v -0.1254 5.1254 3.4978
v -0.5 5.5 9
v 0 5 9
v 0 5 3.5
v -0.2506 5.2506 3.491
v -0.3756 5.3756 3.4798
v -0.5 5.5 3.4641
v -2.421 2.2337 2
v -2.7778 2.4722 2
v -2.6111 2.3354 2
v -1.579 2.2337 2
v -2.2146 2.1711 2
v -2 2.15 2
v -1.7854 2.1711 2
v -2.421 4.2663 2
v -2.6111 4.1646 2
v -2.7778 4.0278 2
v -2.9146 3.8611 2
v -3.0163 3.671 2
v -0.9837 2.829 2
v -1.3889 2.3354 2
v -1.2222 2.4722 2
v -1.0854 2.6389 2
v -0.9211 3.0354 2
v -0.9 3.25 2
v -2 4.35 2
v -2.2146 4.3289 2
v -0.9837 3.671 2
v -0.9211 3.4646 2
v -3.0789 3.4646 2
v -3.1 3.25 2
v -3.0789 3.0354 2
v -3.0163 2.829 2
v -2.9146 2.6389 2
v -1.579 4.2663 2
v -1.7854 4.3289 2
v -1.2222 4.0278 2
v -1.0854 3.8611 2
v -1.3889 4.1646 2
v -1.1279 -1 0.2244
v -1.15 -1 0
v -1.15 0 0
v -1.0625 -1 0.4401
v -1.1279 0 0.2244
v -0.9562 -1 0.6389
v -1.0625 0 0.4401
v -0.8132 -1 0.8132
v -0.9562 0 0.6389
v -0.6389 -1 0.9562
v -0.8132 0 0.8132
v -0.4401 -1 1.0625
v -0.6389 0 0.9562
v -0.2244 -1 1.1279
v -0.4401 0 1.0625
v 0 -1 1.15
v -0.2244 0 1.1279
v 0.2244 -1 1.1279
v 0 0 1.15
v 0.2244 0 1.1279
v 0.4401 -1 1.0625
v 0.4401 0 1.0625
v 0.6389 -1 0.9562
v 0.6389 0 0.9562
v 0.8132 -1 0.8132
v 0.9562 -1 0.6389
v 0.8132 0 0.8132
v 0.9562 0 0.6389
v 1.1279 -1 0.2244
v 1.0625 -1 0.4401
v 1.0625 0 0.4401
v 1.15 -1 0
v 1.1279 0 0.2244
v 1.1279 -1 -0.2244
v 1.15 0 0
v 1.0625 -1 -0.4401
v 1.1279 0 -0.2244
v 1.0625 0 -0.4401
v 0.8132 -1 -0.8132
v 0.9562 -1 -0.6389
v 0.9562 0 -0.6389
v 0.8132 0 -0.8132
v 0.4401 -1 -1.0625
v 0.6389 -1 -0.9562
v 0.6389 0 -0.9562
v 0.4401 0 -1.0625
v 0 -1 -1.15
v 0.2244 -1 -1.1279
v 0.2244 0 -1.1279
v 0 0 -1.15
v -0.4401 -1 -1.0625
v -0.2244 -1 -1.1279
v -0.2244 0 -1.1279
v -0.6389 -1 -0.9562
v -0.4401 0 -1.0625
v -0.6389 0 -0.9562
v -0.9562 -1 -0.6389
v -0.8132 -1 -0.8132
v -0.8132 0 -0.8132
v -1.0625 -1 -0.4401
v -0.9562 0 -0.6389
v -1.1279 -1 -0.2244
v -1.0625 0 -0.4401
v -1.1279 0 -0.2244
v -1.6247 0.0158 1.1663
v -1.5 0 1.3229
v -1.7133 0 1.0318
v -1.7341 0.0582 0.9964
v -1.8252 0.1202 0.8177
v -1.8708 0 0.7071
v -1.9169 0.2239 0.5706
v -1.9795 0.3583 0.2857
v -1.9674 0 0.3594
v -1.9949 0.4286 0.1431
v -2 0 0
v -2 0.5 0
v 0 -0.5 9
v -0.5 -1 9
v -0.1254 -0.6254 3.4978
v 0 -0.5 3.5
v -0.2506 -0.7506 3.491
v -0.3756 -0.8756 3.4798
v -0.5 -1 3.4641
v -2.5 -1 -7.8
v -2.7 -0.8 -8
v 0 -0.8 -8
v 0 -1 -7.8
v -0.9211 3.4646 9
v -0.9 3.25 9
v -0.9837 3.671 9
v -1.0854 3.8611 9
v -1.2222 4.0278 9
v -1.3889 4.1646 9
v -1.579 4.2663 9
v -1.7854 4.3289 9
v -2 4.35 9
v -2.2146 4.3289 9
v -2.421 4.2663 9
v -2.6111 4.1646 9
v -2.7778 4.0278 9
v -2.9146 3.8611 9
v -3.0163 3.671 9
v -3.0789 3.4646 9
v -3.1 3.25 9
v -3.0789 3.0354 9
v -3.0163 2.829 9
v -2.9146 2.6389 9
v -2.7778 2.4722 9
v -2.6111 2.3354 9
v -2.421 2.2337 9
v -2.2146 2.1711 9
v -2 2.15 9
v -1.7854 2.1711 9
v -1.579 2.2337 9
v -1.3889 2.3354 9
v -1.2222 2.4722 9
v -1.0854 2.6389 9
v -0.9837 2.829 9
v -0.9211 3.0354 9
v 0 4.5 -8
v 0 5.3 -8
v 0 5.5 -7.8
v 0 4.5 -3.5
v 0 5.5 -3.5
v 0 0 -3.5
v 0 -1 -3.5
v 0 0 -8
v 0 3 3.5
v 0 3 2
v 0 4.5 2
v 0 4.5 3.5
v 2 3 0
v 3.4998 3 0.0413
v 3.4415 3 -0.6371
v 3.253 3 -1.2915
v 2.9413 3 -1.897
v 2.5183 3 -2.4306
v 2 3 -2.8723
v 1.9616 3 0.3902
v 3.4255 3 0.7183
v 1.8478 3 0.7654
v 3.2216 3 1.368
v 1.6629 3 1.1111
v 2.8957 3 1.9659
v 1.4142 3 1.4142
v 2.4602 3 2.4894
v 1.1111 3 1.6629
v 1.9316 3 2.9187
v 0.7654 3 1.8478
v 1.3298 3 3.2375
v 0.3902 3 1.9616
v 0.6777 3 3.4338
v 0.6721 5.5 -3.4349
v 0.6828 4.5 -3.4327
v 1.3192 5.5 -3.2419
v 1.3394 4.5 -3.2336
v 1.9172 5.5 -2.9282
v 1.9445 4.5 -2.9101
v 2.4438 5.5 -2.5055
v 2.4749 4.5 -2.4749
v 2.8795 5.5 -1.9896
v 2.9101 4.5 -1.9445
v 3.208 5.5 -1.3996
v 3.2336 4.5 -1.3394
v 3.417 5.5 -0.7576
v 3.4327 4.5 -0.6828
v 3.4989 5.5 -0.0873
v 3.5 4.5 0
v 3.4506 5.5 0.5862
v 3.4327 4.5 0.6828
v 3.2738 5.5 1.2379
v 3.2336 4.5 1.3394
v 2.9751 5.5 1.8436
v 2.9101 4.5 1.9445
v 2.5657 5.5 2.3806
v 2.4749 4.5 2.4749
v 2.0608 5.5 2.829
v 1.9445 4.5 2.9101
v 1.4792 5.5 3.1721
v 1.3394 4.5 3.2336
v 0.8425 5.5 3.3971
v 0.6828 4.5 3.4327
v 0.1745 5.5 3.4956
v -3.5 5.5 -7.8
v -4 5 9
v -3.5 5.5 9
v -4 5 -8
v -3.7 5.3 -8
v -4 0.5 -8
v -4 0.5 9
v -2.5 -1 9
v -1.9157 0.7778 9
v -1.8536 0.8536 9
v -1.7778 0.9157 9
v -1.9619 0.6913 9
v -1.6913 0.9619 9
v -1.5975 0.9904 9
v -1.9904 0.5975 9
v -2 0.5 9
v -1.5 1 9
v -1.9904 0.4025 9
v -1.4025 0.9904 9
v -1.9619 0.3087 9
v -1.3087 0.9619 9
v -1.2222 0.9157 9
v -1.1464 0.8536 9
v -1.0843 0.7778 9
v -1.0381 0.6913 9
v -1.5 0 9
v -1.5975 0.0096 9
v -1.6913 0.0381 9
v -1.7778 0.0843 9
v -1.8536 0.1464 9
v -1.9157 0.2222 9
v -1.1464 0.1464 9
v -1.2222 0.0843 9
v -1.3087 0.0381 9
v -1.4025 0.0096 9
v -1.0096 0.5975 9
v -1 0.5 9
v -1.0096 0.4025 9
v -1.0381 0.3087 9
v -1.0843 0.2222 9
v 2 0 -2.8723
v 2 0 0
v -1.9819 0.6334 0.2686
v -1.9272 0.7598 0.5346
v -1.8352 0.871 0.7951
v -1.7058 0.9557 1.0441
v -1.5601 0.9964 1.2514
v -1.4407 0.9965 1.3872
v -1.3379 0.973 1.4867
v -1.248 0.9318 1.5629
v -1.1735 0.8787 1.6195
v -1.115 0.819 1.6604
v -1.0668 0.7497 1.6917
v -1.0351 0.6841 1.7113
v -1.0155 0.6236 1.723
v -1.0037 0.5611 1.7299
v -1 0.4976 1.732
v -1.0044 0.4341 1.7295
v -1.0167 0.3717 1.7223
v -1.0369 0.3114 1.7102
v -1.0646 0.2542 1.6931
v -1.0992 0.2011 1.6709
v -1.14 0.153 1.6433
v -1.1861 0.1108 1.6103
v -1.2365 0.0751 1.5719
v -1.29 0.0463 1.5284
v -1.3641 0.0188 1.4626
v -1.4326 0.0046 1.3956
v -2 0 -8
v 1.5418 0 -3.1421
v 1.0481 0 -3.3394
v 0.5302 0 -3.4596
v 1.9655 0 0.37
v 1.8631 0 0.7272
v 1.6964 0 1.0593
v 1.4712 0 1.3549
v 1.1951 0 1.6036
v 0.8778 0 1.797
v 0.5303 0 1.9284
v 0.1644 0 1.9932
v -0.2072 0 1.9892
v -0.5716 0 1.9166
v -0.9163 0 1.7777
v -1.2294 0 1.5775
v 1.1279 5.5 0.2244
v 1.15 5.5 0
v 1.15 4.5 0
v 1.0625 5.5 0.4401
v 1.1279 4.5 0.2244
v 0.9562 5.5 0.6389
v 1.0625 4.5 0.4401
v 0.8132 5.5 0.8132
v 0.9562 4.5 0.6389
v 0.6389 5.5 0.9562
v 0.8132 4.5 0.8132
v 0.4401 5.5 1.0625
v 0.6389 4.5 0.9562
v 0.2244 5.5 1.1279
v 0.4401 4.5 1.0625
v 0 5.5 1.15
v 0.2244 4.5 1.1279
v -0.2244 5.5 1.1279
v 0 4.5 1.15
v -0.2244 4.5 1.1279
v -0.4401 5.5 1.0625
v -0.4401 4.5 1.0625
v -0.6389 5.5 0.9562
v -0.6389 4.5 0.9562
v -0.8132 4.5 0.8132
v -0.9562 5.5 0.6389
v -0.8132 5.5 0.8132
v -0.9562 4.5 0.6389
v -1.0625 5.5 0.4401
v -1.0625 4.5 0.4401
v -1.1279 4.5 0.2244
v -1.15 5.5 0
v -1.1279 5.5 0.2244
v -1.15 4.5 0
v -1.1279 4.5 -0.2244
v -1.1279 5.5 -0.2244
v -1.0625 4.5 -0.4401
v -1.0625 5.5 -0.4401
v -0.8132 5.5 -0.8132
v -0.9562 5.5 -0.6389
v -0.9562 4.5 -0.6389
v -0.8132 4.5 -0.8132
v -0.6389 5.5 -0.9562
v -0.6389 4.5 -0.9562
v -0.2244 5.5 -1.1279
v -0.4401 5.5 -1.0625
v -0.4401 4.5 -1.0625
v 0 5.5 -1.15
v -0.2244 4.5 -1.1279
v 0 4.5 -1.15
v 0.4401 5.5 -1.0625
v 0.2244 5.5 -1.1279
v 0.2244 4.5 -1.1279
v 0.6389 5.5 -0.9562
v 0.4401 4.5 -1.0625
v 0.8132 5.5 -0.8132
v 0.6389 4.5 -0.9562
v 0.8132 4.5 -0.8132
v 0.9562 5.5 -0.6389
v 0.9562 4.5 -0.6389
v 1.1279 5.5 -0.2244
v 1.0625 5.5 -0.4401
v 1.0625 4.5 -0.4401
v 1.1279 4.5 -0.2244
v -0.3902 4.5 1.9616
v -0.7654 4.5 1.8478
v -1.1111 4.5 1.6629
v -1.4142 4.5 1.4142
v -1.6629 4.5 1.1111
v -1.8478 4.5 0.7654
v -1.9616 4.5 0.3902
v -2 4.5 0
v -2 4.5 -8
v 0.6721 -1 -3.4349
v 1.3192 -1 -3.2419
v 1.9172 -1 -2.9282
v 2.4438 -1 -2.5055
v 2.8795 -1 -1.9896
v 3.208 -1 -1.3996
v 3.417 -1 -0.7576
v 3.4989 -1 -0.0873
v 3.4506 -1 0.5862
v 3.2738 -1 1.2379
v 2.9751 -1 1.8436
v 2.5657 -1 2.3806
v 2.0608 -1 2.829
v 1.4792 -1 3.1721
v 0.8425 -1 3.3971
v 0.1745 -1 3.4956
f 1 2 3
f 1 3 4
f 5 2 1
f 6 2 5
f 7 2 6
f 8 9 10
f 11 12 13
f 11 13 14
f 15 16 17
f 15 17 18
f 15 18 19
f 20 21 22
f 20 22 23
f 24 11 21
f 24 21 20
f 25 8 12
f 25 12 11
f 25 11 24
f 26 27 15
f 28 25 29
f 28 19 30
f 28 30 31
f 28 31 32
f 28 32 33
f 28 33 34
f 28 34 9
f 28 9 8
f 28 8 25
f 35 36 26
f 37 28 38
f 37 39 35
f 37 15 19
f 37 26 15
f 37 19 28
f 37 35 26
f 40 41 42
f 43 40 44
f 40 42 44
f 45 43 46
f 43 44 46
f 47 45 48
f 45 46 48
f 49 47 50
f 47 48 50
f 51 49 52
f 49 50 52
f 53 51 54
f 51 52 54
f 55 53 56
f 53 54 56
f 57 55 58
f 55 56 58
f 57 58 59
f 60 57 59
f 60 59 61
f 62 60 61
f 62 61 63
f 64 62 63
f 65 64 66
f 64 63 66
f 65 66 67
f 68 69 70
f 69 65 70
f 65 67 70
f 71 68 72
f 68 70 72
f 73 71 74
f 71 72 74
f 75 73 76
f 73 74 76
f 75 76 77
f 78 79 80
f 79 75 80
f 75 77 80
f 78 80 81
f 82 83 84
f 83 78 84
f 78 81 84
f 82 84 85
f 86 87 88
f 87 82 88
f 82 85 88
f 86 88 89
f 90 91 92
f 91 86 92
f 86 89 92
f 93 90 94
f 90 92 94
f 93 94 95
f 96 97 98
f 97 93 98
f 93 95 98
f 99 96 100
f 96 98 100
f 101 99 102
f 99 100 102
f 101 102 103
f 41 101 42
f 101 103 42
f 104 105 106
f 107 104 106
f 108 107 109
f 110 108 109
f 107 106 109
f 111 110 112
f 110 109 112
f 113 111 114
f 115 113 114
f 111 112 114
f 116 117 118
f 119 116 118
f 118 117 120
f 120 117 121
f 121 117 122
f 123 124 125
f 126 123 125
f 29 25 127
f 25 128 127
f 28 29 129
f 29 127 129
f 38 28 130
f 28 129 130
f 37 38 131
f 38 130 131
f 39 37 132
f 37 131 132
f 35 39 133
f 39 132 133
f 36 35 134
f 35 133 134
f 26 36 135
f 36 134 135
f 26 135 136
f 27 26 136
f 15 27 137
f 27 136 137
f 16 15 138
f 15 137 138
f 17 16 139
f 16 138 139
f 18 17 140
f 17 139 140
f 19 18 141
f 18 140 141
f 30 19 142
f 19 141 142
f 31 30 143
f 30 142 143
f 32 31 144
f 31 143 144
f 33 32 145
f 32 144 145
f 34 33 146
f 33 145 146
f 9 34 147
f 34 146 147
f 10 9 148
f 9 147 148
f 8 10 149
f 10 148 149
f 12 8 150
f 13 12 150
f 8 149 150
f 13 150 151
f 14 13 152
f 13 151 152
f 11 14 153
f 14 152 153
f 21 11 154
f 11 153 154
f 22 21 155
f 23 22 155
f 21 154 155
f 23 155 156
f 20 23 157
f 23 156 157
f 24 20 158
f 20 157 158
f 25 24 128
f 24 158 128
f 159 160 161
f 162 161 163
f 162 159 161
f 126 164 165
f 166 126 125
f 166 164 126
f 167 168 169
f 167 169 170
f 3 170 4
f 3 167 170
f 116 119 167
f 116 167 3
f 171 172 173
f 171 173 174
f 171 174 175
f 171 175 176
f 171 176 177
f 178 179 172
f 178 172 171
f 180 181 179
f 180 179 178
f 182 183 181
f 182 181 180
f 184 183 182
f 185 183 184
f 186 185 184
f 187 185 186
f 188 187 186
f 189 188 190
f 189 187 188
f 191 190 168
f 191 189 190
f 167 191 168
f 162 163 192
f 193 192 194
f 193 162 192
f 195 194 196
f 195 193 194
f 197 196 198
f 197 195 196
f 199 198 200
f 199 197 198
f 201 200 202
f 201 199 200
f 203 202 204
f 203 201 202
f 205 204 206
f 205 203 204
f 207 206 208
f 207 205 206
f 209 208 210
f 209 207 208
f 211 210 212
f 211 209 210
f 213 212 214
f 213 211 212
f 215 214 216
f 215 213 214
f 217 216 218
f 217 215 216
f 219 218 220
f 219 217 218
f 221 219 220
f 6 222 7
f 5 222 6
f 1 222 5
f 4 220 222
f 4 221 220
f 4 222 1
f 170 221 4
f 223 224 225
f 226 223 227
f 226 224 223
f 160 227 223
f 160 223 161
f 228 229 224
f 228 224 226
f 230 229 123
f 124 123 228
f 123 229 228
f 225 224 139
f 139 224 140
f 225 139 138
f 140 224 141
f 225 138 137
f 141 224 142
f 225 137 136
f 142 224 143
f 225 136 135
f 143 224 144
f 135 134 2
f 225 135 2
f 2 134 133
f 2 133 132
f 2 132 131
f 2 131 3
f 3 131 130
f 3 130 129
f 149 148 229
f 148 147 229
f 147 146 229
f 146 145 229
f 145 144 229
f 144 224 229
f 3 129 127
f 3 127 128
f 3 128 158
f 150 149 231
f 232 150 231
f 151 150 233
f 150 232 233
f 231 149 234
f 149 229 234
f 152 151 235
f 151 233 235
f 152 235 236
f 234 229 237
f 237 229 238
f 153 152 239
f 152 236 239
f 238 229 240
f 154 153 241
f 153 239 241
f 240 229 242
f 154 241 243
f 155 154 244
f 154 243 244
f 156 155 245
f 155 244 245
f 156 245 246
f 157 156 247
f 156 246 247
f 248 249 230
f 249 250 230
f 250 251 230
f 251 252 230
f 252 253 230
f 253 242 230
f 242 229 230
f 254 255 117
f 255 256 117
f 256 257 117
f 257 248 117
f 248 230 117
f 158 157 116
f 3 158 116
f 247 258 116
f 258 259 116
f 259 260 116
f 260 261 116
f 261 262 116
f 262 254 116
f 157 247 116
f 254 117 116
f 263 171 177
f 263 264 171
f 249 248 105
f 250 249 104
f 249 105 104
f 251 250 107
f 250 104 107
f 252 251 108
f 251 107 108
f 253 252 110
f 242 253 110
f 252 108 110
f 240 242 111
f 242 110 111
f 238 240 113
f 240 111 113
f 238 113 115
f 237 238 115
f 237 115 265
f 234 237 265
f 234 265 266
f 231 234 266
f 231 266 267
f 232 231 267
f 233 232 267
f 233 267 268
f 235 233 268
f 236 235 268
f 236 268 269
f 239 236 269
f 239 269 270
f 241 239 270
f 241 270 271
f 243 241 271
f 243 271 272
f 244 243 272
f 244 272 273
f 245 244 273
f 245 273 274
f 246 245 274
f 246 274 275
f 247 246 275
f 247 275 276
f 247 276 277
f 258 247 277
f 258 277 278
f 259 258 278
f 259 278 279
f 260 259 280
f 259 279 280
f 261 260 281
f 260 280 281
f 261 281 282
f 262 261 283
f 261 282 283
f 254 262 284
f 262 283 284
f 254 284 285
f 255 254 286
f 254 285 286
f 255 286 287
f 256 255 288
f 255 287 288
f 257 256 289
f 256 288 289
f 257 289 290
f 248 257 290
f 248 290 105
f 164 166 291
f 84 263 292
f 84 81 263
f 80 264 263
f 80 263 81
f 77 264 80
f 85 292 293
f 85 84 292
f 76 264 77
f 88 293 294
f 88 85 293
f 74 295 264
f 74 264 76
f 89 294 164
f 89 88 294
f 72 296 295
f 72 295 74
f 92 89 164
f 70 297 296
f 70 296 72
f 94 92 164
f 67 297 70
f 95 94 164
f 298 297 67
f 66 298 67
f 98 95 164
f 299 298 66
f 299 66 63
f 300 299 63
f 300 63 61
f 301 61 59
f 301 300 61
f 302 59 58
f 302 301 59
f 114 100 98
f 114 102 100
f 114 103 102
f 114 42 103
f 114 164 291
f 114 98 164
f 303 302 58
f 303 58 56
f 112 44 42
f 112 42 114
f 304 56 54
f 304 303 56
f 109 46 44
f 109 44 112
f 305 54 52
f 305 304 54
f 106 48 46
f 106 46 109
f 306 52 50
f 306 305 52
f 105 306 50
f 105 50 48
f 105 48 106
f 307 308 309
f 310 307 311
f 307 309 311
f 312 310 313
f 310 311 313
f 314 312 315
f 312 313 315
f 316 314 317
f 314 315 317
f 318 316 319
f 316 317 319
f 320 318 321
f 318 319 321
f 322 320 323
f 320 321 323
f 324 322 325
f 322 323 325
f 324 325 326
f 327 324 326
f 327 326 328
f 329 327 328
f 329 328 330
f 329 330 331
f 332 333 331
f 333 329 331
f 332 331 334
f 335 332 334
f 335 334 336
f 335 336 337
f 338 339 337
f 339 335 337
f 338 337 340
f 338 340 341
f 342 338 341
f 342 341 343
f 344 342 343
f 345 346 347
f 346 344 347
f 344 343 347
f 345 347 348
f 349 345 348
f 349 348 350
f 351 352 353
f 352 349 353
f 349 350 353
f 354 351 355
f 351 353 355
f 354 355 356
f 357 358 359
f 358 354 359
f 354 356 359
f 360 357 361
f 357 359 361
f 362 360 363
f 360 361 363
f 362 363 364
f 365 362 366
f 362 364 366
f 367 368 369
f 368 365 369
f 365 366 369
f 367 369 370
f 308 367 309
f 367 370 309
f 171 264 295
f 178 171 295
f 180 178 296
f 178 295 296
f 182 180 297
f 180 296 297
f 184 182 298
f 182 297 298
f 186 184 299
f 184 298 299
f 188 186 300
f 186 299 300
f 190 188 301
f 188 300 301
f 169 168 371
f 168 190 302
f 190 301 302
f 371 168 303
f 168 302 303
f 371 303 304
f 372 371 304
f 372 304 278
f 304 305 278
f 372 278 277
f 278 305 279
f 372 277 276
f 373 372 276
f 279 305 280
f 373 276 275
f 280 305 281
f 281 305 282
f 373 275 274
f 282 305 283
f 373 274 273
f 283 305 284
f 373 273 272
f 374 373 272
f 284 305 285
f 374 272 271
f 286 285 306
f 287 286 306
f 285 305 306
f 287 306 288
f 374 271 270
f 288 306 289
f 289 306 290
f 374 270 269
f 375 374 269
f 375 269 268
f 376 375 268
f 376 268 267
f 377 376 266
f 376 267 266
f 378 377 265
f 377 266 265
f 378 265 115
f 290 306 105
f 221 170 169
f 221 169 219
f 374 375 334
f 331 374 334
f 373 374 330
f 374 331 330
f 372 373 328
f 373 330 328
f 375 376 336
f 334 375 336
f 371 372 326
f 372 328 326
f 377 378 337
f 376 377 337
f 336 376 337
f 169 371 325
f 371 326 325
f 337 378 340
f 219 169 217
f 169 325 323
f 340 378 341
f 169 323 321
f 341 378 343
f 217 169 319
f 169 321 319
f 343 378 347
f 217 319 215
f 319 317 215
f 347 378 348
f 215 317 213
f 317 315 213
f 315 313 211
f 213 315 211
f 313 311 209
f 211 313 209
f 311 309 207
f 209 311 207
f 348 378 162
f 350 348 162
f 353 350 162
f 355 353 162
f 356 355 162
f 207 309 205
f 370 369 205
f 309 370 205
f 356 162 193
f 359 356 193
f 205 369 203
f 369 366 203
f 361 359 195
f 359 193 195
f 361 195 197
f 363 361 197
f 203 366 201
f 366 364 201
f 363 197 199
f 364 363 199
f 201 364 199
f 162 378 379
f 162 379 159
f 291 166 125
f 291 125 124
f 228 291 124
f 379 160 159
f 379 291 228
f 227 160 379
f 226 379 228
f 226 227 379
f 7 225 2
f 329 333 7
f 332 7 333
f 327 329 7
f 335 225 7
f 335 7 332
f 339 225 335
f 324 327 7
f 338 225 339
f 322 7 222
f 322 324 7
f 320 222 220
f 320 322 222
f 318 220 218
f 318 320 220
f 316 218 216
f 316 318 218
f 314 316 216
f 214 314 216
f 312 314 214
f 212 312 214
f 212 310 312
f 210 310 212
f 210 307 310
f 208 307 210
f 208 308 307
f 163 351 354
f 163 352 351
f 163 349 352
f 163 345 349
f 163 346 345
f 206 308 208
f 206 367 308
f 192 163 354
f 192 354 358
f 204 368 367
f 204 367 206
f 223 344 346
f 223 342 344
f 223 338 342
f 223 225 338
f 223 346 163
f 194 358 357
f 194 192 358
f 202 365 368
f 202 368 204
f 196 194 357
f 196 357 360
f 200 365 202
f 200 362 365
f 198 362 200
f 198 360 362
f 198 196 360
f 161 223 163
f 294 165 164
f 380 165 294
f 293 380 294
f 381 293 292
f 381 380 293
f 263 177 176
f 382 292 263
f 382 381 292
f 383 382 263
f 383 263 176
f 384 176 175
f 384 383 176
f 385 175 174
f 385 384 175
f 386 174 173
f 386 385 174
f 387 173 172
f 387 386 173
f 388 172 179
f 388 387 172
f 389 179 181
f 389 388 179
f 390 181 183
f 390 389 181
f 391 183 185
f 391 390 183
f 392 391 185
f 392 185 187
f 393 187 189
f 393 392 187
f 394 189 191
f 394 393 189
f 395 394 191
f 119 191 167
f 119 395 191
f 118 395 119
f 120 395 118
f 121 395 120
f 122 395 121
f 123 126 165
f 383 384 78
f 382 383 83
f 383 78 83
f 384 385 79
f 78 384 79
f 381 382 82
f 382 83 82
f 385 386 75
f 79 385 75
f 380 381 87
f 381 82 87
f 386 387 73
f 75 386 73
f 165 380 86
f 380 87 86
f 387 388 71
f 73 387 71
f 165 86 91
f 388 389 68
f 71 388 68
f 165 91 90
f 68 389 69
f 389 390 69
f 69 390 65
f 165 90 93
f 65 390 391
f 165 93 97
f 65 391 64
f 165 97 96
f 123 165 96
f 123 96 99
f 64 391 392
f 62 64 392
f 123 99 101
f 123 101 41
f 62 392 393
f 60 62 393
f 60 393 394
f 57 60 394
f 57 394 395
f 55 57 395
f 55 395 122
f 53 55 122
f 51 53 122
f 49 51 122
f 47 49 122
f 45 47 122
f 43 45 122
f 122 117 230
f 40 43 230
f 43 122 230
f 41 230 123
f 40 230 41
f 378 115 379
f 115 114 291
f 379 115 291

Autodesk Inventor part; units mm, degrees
ref_plane "YZ Plane" through (0, 0, 0) normal (1, 0, 0) x (0, 1, 0)
ref_plane "XZ Plane" through (0, 0, 0) normal (0, 1, 0) x (-1, 0, 0)
ref_plane "XY Plane" through (0, 0, 0) normal (0, 0, 1) x (1, 0, 0)
sketch "スケッチ1" plane through (0, 0, 0) normal (0, 1, 0) x (-1, 0, 0)
  circle A0 centre (0, 0) radius 1.15
  circle A1 centre (0, 0) radius 2
  circle A2 centre (0, 0) radius 3.5
  line L0 (0, 0) -> (0, 3.5)
  line L1 (2, 0) -> (-2, 0)
  line L2 (2, 0) -> (2, -2.8723)
  line L3 (-2, 0) -> (-2, -2.8723)
  line L4 (0, 2) -> (3.5, 2)
  line L5 (3.5, 2) -> (3.5, 6)
  line L6 (3.5, 6) -> (0, 6)
  line L7 (0, 6) -> (0, 2)
  line L8 (0, 6) -> (3.5, 6)
  line L9 (3.5, 6) -> (3.5, 0)
  line L10 (3.5, 0) -> (0, 0)
  line L11 (0, 0) -> (0, 6)
  line L12 (0, 0) -> (0, -8)
  line L13 (0, 0) -> (3.5, 0)
  line L14 (3.5, 0) -> (3.5, -8)
  line L15 (3.5, -8) -> (0, -8)
  line L16 (0, -8) -> (0, 0)
  line L17 (2, -2.8723) -> (2, -8)
  line L18 (0, -8) -> (3.5, -4.5)
  line L19 (0, -8) -> (4.9497, -8) construction
  line L20 (0, 0) -> (3.5, 0)
  line L21 (3.5, 0) -> (3.5, -9)
  line L22 (3.5, -9) -> (0, -9)
  line L23 (0, -9) -> (0, 0)
  line L24 (0, 2) -> (4, 2)
  line L25 (4, 2) -> (4, 9)
  line L26 (4, 9) -> (0, 9)
  line L27 (0, 9) -> (0, 2)
  line L28 (0, 9) -> (4, 9)
  line L29 (4, 9) -> (4, -9)
  line L30 (4, -9) -> (0, -9)
  line L31 (0, -9) -> (0, 9)
  line L32 (0, 0) -> (2, 0)
  line L33 (2, 0) -> (2, -9)
  line L34 (2, -9) -> (0, -9)
  line L35 (0, -9) -> (0, 0)
  point P0 (2, -6)
  point P1 (0, -3.5)
  dimension "d0" = 2.3
  dimension "d1" = 4
  dimension "d2" = 7
  dimension "d3" = 3.5
  dimension "d4" = 4
  dimension "d5" = 8
  dimension "d6" = 45
  dimension "d40" = 9
  dimension "d41" = 4
  dimension "d42" = 7
extrude "押し出し1" add sketch "スケッチ1" along normal blind 3 contours A1 L3 A2 L0
extrude "押し出し2" add sketch "スケッチ1" along normal blind 4.5 contours L10 A2 L2 | A1 L4 A2 L10 | L0 A2 L4 | A2 L14 L18 L17 | A2 L4 L9 | L9 L24 L29 L30 L21 L14 | L7 L6 L5 L4 A2 | L18 L14 L15 L17 | L5 L6 L27 L26 L25 L24 | L15 L21 L22 L33
extrude "押し出し3" add sketch "スケッチ1" against normal blind 1 contours L1 A1 L12 A0 | A0 L0 A1 L1 | A0 L1 A1 L0 | L12 A1 L1 A0 | L2 A2 L12 A1 | L10 A2 L2 | A1 L4 A2 L10 | A1 L3 A2 L0 | L0 A2 L4 | L12 A2 L3 A1 | L17 L18 L12 A2 | A2 L14 L18 L17 | A2 L4 L9 | L9 L24 L29 L30 L21 L14 | L7 L6 L5 L4 A2 | L18 L14 L15 L17 | L17 L15 L18 | L5 L6 L27 L26 L25 L24 | L15 L33 L22 L23 | L15 L21 L22 L33
sketch "スケッチ4" plane through (0, 4.5, 0) normal (0, 1, 0) x (1, 0, 0)
  circle A0 centre (0, 0) radius 1.15
  circle A1 centre (0, 0) radius 2
  circle A2 centre (0, 0) radius 3.5
  line L0 (-4, 9) -> (-4, -9) projected
  line L1 (0, 0) -> (-4, 0)
  line L2 (-4, 0) -> (-4, -9)
  line L3 (-4, -9) -> (0, -9)
  line L4 (0, -9) -> (0, 0)
  line L5 (0, 0) -> (-4, 0)
  line L6 (-4, 0) -> (-4, 9)
  line L7 (-4, 9) -> (0, 9)
  line L8 (0, 9) -> (0, 0)
  point P0 (0, -3.5)
  point P1 (0, 3.5)
  dimension "d43" = 2.3
  dimension "d44" = 4
  dimension "d45" = 7
  dimension "d46" = 4
  dimension "d47" = 9
extrude "押し出し6" add sketch "スケッチ4" along normal blind 1 contours A0 L8 A1 L4 | A0 L1 A1 L8 | L4 A1 L1 A0 | L8 A2 L4 A1 | A1 L1 A2 L8 | L4 A2 L1 A1 | A2 L1 L0 L7 L8 | L4 L3 L0 L1 A2
sketch "スケッチ5" plane through (-4, -1, 9) normal (0, 0, 1) x (1, 0, 0)
  line L0 (4, 0) -> (4, 4) projected
  line L1 (4, 0) -> (0, 0)
  line L2 (0, 0) -> (0, 1)
  line L3 (0, 1) -> (4, 1)
  line L4 (4, 1) -> (4, 0)
  line L5 (4, 1) -> (2.5, 1)
  line L6 (2.5, 1) -> (2.5, 1.5)
  line L7 (2.5, 1.5) -> (4, 1.5)
  line L8 (4, 1.5) -> (4, 1)
  line L9 (4, 6.5) -> (0, 6.5) projected
  line L10 (0, 6.5) -> (2, 6.5)
  line L11 (2, 6.5) -> (2, 4.25)
  line L12 (2, 4.25) -> (0, 4.25)
  line L13 (0, 4.25) -> (0, 6.5)
  circle A0 centre (2, 4.25) radius 1.1
  dimension "d50" = 4
  dimension "d51" = 1
  dimension "d52" = 1.5
  dimension "d53" = 0.5
  dimension "d54" = 2
  dimension "d55" = 2.25
  dimension "d56" = 2.2
extrude "押し出し7" cut sketch "スケッチ5" against normal blind 7 contours A0 L12 L11 | L11 L12 A0
hole "穴2" at (-1.5, 0.5, 9) direction (0, 0, -1) diameter 1 end through all
chamfer "面取り1" distance 0.5 angle 45 3 edges at (0, -1, 6.25) (0, 5.5, 6.25) (-4, 5.5, 0)
chamfer "面取り2" distance 1.5 angle 45 1 edges at (-4, -1, 0)
sketch "スケッチ6" plane through (0, 0, -9) normal (0, 0, -1) x (-1, 0, 0)
  line L0 (0, 5.5) -> (4, 5.5)
  line L1 (4, 5.5) -> (4, -1)
  line L2 (4, -1) -> (0, -1)
  line L3 (0, -1) -> (0, 5.5)
  point P0 (0, 0)
  dimension "d72" = 4
  dimension "d73" = 6.5
extrude "押し出し8" cut sketch "スケッチ6" against normal blind 1
chamfer "面取り3" distance 0.2 angle 45 2 edges at (-1.75, 5.5, -8) (-1.25, -1, -8)
properties part number "rod6.3"
